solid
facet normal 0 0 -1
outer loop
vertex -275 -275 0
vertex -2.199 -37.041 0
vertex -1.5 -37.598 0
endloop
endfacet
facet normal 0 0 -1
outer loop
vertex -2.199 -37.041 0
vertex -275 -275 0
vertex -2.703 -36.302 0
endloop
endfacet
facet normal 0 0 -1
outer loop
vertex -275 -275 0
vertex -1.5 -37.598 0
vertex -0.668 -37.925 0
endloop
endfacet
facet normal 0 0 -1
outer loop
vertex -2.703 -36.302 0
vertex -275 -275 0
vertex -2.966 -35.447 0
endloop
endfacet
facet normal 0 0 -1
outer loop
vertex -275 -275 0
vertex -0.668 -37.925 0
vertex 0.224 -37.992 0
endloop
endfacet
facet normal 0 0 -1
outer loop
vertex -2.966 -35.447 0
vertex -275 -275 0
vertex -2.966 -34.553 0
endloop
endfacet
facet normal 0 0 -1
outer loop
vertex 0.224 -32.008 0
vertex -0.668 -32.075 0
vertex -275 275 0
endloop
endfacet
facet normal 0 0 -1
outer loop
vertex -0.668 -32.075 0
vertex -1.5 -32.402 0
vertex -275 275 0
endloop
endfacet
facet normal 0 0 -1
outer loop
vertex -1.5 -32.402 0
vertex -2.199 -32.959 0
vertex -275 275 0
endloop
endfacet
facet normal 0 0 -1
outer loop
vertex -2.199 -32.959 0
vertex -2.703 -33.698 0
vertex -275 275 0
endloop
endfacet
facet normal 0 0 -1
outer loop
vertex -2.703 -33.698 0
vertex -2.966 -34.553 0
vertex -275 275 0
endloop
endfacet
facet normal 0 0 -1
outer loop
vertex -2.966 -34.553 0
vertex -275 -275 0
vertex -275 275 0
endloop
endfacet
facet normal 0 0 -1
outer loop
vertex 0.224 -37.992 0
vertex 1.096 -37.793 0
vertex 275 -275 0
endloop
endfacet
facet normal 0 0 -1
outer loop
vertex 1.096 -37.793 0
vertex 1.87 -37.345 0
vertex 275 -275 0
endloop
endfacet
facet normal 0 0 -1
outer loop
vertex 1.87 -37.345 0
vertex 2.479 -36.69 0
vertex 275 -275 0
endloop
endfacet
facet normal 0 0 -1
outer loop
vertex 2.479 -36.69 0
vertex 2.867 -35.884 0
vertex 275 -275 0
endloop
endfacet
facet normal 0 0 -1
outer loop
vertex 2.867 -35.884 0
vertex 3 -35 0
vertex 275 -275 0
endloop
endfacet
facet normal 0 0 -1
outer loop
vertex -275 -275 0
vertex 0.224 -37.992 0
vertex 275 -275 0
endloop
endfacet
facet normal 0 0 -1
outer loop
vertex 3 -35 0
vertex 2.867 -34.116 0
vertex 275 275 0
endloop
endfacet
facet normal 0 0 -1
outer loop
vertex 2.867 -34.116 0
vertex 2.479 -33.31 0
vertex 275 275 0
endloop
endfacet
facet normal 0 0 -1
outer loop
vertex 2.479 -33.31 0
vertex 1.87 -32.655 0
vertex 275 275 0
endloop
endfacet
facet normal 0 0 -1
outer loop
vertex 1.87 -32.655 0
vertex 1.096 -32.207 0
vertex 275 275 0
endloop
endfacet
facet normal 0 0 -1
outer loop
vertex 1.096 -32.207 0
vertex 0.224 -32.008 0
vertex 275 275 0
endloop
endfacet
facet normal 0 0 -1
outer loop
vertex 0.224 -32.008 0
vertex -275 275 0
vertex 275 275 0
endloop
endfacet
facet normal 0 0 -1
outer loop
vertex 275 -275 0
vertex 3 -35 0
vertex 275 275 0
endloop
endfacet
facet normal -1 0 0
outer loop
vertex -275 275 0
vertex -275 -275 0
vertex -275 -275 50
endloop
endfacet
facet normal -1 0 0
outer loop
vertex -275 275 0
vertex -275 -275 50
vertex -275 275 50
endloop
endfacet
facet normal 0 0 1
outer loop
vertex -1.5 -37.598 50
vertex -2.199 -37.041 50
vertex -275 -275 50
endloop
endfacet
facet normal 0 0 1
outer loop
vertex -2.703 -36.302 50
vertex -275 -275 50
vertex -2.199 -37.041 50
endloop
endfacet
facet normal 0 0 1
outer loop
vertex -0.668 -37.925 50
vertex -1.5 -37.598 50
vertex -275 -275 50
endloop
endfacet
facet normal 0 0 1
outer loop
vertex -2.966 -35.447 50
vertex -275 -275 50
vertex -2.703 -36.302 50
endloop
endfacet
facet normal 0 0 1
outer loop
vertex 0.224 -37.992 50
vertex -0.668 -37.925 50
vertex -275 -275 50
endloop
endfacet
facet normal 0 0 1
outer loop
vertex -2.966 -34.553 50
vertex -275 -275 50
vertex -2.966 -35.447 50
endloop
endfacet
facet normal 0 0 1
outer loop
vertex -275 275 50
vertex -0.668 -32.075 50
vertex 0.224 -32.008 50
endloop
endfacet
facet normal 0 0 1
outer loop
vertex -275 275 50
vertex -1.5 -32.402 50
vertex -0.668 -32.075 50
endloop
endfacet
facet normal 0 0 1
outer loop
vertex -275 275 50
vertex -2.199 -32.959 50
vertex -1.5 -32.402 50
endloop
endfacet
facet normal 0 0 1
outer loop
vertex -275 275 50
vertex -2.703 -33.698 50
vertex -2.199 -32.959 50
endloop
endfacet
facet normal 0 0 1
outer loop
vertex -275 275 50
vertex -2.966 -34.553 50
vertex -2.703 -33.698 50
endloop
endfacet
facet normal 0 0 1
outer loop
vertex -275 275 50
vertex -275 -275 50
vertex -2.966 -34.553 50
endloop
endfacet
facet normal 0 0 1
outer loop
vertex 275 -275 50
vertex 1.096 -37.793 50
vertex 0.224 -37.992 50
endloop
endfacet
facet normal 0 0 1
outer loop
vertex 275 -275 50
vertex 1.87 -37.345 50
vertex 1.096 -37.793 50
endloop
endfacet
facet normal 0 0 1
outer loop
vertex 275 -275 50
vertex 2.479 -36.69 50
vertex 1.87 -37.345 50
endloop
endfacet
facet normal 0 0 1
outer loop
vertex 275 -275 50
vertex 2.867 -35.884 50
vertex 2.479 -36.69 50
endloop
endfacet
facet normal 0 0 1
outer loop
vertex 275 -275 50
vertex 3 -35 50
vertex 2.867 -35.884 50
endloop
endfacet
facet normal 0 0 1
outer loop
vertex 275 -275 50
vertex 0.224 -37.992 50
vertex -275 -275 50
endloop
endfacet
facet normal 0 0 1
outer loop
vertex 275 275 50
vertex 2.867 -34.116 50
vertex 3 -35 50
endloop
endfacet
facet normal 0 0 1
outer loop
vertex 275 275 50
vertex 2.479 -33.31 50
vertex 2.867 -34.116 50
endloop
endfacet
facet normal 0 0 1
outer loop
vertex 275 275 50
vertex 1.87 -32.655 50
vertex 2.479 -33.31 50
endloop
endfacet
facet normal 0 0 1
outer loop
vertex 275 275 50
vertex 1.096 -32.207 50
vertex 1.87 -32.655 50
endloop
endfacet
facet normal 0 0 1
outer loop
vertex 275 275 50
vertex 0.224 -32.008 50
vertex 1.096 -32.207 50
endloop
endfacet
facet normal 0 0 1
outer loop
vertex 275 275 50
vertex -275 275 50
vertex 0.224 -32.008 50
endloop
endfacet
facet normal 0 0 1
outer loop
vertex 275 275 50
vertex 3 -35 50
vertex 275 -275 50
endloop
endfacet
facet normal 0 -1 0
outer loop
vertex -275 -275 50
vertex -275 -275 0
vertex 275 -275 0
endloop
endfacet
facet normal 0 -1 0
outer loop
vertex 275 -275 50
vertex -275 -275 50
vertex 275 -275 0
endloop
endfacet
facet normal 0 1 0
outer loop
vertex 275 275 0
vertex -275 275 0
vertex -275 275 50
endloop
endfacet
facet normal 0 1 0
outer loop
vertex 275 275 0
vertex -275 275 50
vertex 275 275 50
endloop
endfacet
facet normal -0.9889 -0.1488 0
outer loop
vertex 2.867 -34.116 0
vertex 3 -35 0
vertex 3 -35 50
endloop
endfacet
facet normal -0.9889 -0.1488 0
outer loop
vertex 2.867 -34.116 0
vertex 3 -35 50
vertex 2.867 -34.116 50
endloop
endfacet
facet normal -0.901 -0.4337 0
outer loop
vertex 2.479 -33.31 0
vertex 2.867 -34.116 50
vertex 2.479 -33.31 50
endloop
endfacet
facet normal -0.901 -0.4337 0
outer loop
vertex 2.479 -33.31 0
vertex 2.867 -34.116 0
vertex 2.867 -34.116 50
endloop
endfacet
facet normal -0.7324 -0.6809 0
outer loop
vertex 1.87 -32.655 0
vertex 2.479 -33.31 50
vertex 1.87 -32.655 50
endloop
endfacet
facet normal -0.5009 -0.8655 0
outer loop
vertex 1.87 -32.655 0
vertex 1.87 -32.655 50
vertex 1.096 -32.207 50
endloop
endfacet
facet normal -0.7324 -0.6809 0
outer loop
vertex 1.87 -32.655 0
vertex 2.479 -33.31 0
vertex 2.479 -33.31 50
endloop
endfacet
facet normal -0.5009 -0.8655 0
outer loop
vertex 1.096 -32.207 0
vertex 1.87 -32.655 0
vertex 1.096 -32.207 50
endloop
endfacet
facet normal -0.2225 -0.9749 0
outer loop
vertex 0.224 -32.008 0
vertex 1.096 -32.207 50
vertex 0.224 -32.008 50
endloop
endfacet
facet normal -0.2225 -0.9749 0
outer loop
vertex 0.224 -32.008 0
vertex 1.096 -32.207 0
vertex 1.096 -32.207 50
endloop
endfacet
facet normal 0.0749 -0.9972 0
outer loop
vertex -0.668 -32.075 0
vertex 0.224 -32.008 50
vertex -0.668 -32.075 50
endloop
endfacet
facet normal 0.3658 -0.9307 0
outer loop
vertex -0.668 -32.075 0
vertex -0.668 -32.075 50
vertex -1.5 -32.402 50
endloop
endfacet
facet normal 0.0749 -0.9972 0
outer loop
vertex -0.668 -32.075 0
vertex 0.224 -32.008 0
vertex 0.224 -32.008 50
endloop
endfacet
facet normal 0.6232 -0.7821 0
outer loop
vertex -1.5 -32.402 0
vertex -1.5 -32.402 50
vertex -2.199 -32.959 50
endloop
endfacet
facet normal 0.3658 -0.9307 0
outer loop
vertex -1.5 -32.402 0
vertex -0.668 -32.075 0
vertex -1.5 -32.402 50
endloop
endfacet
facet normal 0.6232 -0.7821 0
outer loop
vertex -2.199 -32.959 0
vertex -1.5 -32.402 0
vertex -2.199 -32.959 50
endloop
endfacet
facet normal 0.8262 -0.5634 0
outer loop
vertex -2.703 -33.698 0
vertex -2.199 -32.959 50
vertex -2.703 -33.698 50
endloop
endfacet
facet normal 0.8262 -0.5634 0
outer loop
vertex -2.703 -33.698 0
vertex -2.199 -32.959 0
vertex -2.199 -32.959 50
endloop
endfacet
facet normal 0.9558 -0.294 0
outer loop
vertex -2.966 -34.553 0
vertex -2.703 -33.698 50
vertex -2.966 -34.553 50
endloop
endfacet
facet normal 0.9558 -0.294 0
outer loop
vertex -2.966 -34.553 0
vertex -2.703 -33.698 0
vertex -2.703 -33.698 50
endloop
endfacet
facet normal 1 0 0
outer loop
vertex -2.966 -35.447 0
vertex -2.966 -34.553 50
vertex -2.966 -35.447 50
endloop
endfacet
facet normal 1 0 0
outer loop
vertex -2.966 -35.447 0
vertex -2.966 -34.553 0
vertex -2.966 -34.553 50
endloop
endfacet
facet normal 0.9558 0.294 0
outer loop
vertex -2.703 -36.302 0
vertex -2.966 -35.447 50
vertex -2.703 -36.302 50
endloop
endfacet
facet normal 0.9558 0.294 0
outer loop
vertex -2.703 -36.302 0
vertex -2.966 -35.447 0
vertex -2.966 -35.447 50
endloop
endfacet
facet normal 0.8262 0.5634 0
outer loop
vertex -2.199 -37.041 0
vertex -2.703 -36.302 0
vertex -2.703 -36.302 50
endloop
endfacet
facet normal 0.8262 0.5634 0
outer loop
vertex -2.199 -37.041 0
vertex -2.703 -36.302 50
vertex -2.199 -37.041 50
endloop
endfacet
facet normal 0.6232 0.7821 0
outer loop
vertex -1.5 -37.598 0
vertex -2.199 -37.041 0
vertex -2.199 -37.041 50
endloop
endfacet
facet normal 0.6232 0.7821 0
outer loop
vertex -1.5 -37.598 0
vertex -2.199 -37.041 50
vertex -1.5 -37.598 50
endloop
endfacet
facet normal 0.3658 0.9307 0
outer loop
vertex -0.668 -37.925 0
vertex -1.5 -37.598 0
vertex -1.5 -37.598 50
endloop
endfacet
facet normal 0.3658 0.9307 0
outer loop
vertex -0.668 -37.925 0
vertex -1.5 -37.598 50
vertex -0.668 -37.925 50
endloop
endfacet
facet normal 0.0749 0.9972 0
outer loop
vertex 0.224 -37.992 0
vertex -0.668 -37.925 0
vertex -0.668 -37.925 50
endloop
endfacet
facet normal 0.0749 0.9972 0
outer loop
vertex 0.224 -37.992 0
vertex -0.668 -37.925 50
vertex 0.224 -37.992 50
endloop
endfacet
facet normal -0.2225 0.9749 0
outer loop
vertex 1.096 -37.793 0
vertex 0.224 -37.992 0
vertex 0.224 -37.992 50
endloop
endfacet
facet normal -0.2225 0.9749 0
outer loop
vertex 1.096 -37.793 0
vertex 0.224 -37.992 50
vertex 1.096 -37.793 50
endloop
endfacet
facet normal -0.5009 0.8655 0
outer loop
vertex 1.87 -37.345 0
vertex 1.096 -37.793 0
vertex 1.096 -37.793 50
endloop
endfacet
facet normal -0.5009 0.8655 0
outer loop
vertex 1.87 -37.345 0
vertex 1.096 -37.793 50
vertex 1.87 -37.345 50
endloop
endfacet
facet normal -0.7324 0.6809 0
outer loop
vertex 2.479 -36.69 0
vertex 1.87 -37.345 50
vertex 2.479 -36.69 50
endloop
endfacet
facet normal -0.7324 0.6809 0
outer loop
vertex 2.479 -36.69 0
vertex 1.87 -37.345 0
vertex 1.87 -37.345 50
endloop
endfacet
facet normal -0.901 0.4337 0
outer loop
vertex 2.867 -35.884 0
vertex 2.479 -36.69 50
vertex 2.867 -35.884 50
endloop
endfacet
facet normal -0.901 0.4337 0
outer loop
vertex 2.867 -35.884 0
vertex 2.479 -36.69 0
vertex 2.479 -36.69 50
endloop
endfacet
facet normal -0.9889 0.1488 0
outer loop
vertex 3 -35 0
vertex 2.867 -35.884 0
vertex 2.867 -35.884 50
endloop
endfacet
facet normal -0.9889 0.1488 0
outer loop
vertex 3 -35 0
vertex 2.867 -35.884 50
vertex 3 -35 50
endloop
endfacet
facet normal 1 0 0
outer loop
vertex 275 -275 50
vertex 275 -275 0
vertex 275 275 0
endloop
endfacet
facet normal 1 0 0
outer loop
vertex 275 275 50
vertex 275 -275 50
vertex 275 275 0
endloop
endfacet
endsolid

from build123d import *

# Parameters (mm, degrees)
F0_W     = 550
F0_H     = 550
F0_R     = 3
F0_W_2   = 50
F0_H_2   = 50
F1_DEPTH = 50


with BuildPart() as f1:
    # F0 (on Top) → F1 (new body)
    with BuildSketch(Plane.XY):
        Rectangle(F0_W, F0_H)
        Polygon((222.5, 272.5), (272.5, 272.5), (272.5, 222.5), (272.5, -222.5), (272.5, -272.5), (222.5, -272.5), (-222.5, -272.5), (-272.5, -272.5), (-272.5, -222.5), (-272.5, 222.5), (-272.5, 272.5), (-222.5, 272.5), align=None, mode=Mode.SUBTRACT)
        Polygon((222.5, 222.5), (222.5, 272.5), (-222.5, 272.5), (-222.5, 222.5), (-272.5, 222.5), (-272.5, -222.5), (-222.5, -222.5), (-222.5, -272.5), (222.5, -272.5), (222.5, -222.5), (272.5, -222.5), (272.5, 222.5), align=None)
        with Locations((0, -35)):
            Circle(F0_R, mode=Mode.SUBTRACT)
        with Locations((-247.5, 247.5)):
            Rectangle(F0_W_2, F0_H_2)
        with Locations((247.5, -247.5)):
            Rectangle(F0_W_2, F0_H_2)
        with Locations((247.5, 247.5)):
            Rectangle(F0_W_2, F0_H_2)
        with Locations((-247.5, -247.5)):
            Rectangle(F0_W_2, F0_H_2)
    extrude(amount=F1_DEPTH)


solid = f1.part
